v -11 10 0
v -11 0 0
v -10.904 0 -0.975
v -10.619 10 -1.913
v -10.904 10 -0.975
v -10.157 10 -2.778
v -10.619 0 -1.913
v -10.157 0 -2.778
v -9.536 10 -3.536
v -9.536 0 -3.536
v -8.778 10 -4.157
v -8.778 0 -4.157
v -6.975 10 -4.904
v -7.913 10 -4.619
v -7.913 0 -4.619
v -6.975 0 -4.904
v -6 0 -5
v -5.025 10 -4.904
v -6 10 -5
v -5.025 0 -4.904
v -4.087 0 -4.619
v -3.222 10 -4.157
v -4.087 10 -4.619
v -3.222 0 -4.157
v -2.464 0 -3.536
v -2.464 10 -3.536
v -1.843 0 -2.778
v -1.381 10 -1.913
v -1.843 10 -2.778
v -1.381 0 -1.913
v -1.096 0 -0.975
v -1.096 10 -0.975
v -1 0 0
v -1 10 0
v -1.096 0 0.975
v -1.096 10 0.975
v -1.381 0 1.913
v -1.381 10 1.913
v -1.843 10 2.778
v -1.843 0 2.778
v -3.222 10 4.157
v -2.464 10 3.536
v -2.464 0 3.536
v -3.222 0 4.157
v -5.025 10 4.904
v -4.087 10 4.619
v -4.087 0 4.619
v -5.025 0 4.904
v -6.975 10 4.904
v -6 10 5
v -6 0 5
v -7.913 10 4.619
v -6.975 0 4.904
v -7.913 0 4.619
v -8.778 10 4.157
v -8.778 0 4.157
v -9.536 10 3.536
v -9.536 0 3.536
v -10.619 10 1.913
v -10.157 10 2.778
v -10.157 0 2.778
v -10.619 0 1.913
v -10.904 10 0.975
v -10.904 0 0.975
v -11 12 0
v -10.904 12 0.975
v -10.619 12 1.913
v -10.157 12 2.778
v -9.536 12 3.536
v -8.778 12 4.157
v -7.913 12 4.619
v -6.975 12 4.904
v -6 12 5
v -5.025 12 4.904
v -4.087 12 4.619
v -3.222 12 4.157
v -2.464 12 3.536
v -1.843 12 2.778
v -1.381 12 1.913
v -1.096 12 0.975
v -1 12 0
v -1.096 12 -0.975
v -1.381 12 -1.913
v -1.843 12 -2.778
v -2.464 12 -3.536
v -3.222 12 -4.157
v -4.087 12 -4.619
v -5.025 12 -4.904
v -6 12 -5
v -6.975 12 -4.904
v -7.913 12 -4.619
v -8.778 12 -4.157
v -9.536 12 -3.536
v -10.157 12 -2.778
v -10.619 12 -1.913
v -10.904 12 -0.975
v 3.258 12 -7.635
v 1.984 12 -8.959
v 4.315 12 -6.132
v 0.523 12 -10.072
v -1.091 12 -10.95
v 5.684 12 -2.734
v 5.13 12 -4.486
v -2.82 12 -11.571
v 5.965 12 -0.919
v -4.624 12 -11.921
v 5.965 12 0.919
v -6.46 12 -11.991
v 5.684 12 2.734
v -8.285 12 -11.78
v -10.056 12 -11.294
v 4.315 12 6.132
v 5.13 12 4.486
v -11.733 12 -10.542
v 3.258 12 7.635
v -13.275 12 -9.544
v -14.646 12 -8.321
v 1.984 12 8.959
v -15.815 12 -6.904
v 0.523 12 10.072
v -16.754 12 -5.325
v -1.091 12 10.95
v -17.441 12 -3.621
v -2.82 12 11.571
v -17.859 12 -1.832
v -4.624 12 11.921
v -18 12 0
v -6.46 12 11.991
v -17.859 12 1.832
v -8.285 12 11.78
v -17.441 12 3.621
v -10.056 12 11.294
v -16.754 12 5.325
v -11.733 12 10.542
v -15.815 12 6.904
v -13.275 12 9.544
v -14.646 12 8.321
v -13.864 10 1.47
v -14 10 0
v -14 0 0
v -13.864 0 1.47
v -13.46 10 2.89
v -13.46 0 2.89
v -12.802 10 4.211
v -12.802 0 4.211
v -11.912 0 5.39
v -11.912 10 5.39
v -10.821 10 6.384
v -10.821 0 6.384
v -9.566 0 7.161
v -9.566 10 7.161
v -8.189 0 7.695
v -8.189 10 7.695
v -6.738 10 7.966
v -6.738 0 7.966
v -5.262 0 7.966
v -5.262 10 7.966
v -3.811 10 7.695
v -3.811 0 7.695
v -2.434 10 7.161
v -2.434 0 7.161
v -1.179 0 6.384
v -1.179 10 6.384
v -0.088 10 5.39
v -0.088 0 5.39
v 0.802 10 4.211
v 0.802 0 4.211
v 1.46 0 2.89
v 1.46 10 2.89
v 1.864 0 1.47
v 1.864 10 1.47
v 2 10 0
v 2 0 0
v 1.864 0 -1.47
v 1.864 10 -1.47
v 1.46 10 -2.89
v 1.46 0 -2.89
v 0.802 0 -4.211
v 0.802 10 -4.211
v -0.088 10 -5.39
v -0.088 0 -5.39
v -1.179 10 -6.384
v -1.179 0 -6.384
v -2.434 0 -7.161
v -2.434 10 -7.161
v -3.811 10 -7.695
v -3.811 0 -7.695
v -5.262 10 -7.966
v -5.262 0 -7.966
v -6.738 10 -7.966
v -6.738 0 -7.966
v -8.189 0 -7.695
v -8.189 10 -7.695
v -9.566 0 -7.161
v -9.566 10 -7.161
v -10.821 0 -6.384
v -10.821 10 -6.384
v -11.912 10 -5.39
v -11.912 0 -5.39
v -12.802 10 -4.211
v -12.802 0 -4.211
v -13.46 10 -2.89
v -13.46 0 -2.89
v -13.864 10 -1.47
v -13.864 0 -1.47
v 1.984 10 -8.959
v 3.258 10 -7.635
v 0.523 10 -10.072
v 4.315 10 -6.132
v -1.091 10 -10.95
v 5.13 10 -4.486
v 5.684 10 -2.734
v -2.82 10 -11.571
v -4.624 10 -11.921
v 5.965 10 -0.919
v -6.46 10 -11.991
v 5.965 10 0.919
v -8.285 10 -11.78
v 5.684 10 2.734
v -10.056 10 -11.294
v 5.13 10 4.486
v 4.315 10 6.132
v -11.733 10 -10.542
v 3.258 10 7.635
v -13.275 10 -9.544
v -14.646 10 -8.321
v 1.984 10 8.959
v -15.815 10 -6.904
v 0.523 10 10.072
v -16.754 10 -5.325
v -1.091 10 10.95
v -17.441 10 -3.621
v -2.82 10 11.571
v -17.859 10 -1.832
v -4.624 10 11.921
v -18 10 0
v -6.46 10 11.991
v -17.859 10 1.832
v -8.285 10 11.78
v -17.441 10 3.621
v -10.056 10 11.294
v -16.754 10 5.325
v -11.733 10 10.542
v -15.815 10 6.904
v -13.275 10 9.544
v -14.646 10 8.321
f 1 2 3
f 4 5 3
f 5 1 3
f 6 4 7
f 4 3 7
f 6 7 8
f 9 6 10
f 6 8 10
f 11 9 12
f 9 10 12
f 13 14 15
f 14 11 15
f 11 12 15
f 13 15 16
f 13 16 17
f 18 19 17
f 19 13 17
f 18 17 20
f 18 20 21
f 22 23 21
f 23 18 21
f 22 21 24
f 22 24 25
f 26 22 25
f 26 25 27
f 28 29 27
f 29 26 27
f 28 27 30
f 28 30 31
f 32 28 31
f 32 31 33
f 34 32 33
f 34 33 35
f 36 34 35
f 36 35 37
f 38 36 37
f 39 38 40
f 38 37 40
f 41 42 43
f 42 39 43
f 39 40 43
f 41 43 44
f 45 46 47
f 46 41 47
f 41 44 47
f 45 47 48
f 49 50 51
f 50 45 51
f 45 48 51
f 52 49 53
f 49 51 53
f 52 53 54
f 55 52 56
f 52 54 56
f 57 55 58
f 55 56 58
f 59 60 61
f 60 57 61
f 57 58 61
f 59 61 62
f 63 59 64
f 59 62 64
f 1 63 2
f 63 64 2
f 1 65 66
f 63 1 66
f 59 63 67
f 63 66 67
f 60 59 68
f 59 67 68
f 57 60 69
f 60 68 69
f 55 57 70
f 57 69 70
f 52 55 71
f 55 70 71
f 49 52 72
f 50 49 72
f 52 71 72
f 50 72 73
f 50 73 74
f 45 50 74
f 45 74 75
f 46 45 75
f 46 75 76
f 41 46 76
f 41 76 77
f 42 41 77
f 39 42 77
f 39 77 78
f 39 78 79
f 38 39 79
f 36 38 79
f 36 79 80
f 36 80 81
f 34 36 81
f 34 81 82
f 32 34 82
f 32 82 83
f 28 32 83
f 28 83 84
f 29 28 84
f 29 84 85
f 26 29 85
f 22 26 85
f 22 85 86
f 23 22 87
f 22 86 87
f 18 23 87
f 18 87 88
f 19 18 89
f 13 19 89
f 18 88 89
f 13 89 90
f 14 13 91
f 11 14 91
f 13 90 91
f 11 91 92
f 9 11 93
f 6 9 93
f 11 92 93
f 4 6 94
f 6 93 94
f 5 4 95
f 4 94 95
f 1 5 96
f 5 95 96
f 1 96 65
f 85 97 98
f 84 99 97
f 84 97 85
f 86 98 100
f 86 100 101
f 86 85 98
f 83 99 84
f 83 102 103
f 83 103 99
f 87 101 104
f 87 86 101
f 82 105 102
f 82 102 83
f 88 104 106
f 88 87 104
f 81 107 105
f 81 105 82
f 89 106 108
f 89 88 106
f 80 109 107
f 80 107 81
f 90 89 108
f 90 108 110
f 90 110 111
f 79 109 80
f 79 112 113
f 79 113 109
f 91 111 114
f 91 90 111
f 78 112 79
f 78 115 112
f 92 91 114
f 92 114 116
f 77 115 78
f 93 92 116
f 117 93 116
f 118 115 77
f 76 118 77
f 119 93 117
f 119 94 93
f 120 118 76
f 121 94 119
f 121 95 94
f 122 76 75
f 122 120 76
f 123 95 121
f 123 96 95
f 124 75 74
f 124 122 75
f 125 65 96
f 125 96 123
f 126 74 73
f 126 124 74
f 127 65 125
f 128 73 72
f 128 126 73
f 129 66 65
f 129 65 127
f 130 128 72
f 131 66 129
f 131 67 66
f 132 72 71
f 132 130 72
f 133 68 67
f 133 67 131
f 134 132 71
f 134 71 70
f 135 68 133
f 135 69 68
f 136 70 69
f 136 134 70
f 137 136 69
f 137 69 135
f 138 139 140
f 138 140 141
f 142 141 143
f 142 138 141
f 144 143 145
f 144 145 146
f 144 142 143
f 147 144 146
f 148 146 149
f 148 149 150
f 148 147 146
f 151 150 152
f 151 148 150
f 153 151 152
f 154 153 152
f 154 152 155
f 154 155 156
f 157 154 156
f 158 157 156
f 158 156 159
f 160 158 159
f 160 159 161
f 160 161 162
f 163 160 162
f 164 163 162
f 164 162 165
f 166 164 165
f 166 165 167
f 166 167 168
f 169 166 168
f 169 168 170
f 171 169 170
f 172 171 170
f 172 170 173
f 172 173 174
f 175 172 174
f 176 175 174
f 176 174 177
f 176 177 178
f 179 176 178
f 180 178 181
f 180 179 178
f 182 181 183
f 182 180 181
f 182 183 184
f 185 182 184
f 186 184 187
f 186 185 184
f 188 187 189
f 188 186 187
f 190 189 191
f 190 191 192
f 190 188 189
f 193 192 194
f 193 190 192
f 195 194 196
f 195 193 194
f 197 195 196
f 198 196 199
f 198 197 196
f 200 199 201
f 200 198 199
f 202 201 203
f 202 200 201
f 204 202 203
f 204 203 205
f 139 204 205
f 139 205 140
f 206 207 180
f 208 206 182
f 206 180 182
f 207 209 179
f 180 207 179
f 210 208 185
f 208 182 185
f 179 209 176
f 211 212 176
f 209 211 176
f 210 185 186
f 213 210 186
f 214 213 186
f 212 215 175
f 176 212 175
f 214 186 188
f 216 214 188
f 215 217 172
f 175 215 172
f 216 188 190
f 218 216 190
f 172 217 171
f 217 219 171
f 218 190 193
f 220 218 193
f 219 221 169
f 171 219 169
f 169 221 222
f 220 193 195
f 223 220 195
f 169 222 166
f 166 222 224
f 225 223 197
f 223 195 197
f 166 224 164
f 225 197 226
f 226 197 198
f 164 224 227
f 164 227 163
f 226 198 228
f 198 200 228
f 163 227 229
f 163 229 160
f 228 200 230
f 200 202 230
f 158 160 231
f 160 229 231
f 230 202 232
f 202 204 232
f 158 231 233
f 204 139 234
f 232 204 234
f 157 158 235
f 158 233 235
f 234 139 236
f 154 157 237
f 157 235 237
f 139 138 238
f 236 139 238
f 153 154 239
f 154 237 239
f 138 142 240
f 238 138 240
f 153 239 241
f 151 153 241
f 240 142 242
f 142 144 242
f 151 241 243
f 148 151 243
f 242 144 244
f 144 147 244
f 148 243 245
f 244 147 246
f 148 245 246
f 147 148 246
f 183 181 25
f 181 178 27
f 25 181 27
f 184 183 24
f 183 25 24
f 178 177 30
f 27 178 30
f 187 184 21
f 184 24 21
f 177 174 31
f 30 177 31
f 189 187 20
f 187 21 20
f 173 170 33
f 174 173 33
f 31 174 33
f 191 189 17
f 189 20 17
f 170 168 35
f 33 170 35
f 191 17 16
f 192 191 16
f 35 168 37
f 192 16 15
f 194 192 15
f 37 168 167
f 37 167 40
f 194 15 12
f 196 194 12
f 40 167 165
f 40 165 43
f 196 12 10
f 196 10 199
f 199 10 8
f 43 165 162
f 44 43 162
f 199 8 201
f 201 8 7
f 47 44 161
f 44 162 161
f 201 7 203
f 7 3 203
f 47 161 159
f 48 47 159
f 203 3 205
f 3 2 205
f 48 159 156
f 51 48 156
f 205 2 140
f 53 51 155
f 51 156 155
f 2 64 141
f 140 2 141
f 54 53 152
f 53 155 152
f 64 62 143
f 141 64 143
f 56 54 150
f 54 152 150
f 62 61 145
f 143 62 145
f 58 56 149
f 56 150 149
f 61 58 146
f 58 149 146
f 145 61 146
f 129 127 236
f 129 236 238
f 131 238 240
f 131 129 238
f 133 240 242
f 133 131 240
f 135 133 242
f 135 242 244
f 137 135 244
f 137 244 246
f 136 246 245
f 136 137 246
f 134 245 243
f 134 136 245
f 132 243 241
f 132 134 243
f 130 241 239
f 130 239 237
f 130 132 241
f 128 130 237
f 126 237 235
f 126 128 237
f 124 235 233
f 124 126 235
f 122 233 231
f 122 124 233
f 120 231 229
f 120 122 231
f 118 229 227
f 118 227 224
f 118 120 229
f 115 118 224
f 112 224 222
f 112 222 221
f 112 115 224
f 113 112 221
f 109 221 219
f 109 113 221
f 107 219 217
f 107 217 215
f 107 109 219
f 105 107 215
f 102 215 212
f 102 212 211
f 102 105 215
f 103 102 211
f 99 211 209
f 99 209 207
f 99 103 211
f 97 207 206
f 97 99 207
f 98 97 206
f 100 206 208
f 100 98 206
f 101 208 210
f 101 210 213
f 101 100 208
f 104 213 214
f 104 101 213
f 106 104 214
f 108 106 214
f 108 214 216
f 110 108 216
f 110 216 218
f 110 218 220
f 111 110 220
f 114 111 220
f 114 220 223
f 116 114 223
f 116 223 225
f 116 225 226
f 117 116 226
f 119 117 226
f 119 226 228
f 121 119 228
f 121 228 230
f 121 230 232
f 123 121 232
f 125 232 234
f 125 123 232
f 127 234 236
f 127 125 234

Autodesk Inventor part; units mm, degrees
ref_plane "YZ Plane" through (0, 0, 0) normal (1, 0, 0) x (0, 1, 0)
ref_plane "XZ Plane" through (0, 0, 0) normal (0, 1, 0) x (-1, 0, 0)
ref_plane "XY Plane" through (0, 0, 0) normal (0, 0, 1) x (1, 0, 0)
sketch "Sketch1" plane through (0, 0, 0) normal (0, 0, 1) x (1, 0, 0)
  line L0 (-11, 0) -> (-14, 0)
  line L1 (-14, 0) -> (-14, 10)
  line L2 (-14, 10) -> (-18, 10)
  line L3 (-18, 10) -> (-18, 12)
  line L4 (-18, 12) -> (-11, 12)
  line L5 (-11, 10) -> (-11, 0)
  line L6 (-11, 10) -> (-11, 12)
  line L7 (-6, 0) -> (-6, 10)
  dimension "d1" = 10
  dimension "d2" = 4
  dimension "d3" = 2
  dimension "d4" = 3
  dimension "d6" = 5
revolve "Revolution1" add sketch "Sketch1" angle 360 about axis through (-6, 0, 0) along (0, 1, 0)
properties part number "Buje para Tornillo" material "Brass, Soft Yellow"
